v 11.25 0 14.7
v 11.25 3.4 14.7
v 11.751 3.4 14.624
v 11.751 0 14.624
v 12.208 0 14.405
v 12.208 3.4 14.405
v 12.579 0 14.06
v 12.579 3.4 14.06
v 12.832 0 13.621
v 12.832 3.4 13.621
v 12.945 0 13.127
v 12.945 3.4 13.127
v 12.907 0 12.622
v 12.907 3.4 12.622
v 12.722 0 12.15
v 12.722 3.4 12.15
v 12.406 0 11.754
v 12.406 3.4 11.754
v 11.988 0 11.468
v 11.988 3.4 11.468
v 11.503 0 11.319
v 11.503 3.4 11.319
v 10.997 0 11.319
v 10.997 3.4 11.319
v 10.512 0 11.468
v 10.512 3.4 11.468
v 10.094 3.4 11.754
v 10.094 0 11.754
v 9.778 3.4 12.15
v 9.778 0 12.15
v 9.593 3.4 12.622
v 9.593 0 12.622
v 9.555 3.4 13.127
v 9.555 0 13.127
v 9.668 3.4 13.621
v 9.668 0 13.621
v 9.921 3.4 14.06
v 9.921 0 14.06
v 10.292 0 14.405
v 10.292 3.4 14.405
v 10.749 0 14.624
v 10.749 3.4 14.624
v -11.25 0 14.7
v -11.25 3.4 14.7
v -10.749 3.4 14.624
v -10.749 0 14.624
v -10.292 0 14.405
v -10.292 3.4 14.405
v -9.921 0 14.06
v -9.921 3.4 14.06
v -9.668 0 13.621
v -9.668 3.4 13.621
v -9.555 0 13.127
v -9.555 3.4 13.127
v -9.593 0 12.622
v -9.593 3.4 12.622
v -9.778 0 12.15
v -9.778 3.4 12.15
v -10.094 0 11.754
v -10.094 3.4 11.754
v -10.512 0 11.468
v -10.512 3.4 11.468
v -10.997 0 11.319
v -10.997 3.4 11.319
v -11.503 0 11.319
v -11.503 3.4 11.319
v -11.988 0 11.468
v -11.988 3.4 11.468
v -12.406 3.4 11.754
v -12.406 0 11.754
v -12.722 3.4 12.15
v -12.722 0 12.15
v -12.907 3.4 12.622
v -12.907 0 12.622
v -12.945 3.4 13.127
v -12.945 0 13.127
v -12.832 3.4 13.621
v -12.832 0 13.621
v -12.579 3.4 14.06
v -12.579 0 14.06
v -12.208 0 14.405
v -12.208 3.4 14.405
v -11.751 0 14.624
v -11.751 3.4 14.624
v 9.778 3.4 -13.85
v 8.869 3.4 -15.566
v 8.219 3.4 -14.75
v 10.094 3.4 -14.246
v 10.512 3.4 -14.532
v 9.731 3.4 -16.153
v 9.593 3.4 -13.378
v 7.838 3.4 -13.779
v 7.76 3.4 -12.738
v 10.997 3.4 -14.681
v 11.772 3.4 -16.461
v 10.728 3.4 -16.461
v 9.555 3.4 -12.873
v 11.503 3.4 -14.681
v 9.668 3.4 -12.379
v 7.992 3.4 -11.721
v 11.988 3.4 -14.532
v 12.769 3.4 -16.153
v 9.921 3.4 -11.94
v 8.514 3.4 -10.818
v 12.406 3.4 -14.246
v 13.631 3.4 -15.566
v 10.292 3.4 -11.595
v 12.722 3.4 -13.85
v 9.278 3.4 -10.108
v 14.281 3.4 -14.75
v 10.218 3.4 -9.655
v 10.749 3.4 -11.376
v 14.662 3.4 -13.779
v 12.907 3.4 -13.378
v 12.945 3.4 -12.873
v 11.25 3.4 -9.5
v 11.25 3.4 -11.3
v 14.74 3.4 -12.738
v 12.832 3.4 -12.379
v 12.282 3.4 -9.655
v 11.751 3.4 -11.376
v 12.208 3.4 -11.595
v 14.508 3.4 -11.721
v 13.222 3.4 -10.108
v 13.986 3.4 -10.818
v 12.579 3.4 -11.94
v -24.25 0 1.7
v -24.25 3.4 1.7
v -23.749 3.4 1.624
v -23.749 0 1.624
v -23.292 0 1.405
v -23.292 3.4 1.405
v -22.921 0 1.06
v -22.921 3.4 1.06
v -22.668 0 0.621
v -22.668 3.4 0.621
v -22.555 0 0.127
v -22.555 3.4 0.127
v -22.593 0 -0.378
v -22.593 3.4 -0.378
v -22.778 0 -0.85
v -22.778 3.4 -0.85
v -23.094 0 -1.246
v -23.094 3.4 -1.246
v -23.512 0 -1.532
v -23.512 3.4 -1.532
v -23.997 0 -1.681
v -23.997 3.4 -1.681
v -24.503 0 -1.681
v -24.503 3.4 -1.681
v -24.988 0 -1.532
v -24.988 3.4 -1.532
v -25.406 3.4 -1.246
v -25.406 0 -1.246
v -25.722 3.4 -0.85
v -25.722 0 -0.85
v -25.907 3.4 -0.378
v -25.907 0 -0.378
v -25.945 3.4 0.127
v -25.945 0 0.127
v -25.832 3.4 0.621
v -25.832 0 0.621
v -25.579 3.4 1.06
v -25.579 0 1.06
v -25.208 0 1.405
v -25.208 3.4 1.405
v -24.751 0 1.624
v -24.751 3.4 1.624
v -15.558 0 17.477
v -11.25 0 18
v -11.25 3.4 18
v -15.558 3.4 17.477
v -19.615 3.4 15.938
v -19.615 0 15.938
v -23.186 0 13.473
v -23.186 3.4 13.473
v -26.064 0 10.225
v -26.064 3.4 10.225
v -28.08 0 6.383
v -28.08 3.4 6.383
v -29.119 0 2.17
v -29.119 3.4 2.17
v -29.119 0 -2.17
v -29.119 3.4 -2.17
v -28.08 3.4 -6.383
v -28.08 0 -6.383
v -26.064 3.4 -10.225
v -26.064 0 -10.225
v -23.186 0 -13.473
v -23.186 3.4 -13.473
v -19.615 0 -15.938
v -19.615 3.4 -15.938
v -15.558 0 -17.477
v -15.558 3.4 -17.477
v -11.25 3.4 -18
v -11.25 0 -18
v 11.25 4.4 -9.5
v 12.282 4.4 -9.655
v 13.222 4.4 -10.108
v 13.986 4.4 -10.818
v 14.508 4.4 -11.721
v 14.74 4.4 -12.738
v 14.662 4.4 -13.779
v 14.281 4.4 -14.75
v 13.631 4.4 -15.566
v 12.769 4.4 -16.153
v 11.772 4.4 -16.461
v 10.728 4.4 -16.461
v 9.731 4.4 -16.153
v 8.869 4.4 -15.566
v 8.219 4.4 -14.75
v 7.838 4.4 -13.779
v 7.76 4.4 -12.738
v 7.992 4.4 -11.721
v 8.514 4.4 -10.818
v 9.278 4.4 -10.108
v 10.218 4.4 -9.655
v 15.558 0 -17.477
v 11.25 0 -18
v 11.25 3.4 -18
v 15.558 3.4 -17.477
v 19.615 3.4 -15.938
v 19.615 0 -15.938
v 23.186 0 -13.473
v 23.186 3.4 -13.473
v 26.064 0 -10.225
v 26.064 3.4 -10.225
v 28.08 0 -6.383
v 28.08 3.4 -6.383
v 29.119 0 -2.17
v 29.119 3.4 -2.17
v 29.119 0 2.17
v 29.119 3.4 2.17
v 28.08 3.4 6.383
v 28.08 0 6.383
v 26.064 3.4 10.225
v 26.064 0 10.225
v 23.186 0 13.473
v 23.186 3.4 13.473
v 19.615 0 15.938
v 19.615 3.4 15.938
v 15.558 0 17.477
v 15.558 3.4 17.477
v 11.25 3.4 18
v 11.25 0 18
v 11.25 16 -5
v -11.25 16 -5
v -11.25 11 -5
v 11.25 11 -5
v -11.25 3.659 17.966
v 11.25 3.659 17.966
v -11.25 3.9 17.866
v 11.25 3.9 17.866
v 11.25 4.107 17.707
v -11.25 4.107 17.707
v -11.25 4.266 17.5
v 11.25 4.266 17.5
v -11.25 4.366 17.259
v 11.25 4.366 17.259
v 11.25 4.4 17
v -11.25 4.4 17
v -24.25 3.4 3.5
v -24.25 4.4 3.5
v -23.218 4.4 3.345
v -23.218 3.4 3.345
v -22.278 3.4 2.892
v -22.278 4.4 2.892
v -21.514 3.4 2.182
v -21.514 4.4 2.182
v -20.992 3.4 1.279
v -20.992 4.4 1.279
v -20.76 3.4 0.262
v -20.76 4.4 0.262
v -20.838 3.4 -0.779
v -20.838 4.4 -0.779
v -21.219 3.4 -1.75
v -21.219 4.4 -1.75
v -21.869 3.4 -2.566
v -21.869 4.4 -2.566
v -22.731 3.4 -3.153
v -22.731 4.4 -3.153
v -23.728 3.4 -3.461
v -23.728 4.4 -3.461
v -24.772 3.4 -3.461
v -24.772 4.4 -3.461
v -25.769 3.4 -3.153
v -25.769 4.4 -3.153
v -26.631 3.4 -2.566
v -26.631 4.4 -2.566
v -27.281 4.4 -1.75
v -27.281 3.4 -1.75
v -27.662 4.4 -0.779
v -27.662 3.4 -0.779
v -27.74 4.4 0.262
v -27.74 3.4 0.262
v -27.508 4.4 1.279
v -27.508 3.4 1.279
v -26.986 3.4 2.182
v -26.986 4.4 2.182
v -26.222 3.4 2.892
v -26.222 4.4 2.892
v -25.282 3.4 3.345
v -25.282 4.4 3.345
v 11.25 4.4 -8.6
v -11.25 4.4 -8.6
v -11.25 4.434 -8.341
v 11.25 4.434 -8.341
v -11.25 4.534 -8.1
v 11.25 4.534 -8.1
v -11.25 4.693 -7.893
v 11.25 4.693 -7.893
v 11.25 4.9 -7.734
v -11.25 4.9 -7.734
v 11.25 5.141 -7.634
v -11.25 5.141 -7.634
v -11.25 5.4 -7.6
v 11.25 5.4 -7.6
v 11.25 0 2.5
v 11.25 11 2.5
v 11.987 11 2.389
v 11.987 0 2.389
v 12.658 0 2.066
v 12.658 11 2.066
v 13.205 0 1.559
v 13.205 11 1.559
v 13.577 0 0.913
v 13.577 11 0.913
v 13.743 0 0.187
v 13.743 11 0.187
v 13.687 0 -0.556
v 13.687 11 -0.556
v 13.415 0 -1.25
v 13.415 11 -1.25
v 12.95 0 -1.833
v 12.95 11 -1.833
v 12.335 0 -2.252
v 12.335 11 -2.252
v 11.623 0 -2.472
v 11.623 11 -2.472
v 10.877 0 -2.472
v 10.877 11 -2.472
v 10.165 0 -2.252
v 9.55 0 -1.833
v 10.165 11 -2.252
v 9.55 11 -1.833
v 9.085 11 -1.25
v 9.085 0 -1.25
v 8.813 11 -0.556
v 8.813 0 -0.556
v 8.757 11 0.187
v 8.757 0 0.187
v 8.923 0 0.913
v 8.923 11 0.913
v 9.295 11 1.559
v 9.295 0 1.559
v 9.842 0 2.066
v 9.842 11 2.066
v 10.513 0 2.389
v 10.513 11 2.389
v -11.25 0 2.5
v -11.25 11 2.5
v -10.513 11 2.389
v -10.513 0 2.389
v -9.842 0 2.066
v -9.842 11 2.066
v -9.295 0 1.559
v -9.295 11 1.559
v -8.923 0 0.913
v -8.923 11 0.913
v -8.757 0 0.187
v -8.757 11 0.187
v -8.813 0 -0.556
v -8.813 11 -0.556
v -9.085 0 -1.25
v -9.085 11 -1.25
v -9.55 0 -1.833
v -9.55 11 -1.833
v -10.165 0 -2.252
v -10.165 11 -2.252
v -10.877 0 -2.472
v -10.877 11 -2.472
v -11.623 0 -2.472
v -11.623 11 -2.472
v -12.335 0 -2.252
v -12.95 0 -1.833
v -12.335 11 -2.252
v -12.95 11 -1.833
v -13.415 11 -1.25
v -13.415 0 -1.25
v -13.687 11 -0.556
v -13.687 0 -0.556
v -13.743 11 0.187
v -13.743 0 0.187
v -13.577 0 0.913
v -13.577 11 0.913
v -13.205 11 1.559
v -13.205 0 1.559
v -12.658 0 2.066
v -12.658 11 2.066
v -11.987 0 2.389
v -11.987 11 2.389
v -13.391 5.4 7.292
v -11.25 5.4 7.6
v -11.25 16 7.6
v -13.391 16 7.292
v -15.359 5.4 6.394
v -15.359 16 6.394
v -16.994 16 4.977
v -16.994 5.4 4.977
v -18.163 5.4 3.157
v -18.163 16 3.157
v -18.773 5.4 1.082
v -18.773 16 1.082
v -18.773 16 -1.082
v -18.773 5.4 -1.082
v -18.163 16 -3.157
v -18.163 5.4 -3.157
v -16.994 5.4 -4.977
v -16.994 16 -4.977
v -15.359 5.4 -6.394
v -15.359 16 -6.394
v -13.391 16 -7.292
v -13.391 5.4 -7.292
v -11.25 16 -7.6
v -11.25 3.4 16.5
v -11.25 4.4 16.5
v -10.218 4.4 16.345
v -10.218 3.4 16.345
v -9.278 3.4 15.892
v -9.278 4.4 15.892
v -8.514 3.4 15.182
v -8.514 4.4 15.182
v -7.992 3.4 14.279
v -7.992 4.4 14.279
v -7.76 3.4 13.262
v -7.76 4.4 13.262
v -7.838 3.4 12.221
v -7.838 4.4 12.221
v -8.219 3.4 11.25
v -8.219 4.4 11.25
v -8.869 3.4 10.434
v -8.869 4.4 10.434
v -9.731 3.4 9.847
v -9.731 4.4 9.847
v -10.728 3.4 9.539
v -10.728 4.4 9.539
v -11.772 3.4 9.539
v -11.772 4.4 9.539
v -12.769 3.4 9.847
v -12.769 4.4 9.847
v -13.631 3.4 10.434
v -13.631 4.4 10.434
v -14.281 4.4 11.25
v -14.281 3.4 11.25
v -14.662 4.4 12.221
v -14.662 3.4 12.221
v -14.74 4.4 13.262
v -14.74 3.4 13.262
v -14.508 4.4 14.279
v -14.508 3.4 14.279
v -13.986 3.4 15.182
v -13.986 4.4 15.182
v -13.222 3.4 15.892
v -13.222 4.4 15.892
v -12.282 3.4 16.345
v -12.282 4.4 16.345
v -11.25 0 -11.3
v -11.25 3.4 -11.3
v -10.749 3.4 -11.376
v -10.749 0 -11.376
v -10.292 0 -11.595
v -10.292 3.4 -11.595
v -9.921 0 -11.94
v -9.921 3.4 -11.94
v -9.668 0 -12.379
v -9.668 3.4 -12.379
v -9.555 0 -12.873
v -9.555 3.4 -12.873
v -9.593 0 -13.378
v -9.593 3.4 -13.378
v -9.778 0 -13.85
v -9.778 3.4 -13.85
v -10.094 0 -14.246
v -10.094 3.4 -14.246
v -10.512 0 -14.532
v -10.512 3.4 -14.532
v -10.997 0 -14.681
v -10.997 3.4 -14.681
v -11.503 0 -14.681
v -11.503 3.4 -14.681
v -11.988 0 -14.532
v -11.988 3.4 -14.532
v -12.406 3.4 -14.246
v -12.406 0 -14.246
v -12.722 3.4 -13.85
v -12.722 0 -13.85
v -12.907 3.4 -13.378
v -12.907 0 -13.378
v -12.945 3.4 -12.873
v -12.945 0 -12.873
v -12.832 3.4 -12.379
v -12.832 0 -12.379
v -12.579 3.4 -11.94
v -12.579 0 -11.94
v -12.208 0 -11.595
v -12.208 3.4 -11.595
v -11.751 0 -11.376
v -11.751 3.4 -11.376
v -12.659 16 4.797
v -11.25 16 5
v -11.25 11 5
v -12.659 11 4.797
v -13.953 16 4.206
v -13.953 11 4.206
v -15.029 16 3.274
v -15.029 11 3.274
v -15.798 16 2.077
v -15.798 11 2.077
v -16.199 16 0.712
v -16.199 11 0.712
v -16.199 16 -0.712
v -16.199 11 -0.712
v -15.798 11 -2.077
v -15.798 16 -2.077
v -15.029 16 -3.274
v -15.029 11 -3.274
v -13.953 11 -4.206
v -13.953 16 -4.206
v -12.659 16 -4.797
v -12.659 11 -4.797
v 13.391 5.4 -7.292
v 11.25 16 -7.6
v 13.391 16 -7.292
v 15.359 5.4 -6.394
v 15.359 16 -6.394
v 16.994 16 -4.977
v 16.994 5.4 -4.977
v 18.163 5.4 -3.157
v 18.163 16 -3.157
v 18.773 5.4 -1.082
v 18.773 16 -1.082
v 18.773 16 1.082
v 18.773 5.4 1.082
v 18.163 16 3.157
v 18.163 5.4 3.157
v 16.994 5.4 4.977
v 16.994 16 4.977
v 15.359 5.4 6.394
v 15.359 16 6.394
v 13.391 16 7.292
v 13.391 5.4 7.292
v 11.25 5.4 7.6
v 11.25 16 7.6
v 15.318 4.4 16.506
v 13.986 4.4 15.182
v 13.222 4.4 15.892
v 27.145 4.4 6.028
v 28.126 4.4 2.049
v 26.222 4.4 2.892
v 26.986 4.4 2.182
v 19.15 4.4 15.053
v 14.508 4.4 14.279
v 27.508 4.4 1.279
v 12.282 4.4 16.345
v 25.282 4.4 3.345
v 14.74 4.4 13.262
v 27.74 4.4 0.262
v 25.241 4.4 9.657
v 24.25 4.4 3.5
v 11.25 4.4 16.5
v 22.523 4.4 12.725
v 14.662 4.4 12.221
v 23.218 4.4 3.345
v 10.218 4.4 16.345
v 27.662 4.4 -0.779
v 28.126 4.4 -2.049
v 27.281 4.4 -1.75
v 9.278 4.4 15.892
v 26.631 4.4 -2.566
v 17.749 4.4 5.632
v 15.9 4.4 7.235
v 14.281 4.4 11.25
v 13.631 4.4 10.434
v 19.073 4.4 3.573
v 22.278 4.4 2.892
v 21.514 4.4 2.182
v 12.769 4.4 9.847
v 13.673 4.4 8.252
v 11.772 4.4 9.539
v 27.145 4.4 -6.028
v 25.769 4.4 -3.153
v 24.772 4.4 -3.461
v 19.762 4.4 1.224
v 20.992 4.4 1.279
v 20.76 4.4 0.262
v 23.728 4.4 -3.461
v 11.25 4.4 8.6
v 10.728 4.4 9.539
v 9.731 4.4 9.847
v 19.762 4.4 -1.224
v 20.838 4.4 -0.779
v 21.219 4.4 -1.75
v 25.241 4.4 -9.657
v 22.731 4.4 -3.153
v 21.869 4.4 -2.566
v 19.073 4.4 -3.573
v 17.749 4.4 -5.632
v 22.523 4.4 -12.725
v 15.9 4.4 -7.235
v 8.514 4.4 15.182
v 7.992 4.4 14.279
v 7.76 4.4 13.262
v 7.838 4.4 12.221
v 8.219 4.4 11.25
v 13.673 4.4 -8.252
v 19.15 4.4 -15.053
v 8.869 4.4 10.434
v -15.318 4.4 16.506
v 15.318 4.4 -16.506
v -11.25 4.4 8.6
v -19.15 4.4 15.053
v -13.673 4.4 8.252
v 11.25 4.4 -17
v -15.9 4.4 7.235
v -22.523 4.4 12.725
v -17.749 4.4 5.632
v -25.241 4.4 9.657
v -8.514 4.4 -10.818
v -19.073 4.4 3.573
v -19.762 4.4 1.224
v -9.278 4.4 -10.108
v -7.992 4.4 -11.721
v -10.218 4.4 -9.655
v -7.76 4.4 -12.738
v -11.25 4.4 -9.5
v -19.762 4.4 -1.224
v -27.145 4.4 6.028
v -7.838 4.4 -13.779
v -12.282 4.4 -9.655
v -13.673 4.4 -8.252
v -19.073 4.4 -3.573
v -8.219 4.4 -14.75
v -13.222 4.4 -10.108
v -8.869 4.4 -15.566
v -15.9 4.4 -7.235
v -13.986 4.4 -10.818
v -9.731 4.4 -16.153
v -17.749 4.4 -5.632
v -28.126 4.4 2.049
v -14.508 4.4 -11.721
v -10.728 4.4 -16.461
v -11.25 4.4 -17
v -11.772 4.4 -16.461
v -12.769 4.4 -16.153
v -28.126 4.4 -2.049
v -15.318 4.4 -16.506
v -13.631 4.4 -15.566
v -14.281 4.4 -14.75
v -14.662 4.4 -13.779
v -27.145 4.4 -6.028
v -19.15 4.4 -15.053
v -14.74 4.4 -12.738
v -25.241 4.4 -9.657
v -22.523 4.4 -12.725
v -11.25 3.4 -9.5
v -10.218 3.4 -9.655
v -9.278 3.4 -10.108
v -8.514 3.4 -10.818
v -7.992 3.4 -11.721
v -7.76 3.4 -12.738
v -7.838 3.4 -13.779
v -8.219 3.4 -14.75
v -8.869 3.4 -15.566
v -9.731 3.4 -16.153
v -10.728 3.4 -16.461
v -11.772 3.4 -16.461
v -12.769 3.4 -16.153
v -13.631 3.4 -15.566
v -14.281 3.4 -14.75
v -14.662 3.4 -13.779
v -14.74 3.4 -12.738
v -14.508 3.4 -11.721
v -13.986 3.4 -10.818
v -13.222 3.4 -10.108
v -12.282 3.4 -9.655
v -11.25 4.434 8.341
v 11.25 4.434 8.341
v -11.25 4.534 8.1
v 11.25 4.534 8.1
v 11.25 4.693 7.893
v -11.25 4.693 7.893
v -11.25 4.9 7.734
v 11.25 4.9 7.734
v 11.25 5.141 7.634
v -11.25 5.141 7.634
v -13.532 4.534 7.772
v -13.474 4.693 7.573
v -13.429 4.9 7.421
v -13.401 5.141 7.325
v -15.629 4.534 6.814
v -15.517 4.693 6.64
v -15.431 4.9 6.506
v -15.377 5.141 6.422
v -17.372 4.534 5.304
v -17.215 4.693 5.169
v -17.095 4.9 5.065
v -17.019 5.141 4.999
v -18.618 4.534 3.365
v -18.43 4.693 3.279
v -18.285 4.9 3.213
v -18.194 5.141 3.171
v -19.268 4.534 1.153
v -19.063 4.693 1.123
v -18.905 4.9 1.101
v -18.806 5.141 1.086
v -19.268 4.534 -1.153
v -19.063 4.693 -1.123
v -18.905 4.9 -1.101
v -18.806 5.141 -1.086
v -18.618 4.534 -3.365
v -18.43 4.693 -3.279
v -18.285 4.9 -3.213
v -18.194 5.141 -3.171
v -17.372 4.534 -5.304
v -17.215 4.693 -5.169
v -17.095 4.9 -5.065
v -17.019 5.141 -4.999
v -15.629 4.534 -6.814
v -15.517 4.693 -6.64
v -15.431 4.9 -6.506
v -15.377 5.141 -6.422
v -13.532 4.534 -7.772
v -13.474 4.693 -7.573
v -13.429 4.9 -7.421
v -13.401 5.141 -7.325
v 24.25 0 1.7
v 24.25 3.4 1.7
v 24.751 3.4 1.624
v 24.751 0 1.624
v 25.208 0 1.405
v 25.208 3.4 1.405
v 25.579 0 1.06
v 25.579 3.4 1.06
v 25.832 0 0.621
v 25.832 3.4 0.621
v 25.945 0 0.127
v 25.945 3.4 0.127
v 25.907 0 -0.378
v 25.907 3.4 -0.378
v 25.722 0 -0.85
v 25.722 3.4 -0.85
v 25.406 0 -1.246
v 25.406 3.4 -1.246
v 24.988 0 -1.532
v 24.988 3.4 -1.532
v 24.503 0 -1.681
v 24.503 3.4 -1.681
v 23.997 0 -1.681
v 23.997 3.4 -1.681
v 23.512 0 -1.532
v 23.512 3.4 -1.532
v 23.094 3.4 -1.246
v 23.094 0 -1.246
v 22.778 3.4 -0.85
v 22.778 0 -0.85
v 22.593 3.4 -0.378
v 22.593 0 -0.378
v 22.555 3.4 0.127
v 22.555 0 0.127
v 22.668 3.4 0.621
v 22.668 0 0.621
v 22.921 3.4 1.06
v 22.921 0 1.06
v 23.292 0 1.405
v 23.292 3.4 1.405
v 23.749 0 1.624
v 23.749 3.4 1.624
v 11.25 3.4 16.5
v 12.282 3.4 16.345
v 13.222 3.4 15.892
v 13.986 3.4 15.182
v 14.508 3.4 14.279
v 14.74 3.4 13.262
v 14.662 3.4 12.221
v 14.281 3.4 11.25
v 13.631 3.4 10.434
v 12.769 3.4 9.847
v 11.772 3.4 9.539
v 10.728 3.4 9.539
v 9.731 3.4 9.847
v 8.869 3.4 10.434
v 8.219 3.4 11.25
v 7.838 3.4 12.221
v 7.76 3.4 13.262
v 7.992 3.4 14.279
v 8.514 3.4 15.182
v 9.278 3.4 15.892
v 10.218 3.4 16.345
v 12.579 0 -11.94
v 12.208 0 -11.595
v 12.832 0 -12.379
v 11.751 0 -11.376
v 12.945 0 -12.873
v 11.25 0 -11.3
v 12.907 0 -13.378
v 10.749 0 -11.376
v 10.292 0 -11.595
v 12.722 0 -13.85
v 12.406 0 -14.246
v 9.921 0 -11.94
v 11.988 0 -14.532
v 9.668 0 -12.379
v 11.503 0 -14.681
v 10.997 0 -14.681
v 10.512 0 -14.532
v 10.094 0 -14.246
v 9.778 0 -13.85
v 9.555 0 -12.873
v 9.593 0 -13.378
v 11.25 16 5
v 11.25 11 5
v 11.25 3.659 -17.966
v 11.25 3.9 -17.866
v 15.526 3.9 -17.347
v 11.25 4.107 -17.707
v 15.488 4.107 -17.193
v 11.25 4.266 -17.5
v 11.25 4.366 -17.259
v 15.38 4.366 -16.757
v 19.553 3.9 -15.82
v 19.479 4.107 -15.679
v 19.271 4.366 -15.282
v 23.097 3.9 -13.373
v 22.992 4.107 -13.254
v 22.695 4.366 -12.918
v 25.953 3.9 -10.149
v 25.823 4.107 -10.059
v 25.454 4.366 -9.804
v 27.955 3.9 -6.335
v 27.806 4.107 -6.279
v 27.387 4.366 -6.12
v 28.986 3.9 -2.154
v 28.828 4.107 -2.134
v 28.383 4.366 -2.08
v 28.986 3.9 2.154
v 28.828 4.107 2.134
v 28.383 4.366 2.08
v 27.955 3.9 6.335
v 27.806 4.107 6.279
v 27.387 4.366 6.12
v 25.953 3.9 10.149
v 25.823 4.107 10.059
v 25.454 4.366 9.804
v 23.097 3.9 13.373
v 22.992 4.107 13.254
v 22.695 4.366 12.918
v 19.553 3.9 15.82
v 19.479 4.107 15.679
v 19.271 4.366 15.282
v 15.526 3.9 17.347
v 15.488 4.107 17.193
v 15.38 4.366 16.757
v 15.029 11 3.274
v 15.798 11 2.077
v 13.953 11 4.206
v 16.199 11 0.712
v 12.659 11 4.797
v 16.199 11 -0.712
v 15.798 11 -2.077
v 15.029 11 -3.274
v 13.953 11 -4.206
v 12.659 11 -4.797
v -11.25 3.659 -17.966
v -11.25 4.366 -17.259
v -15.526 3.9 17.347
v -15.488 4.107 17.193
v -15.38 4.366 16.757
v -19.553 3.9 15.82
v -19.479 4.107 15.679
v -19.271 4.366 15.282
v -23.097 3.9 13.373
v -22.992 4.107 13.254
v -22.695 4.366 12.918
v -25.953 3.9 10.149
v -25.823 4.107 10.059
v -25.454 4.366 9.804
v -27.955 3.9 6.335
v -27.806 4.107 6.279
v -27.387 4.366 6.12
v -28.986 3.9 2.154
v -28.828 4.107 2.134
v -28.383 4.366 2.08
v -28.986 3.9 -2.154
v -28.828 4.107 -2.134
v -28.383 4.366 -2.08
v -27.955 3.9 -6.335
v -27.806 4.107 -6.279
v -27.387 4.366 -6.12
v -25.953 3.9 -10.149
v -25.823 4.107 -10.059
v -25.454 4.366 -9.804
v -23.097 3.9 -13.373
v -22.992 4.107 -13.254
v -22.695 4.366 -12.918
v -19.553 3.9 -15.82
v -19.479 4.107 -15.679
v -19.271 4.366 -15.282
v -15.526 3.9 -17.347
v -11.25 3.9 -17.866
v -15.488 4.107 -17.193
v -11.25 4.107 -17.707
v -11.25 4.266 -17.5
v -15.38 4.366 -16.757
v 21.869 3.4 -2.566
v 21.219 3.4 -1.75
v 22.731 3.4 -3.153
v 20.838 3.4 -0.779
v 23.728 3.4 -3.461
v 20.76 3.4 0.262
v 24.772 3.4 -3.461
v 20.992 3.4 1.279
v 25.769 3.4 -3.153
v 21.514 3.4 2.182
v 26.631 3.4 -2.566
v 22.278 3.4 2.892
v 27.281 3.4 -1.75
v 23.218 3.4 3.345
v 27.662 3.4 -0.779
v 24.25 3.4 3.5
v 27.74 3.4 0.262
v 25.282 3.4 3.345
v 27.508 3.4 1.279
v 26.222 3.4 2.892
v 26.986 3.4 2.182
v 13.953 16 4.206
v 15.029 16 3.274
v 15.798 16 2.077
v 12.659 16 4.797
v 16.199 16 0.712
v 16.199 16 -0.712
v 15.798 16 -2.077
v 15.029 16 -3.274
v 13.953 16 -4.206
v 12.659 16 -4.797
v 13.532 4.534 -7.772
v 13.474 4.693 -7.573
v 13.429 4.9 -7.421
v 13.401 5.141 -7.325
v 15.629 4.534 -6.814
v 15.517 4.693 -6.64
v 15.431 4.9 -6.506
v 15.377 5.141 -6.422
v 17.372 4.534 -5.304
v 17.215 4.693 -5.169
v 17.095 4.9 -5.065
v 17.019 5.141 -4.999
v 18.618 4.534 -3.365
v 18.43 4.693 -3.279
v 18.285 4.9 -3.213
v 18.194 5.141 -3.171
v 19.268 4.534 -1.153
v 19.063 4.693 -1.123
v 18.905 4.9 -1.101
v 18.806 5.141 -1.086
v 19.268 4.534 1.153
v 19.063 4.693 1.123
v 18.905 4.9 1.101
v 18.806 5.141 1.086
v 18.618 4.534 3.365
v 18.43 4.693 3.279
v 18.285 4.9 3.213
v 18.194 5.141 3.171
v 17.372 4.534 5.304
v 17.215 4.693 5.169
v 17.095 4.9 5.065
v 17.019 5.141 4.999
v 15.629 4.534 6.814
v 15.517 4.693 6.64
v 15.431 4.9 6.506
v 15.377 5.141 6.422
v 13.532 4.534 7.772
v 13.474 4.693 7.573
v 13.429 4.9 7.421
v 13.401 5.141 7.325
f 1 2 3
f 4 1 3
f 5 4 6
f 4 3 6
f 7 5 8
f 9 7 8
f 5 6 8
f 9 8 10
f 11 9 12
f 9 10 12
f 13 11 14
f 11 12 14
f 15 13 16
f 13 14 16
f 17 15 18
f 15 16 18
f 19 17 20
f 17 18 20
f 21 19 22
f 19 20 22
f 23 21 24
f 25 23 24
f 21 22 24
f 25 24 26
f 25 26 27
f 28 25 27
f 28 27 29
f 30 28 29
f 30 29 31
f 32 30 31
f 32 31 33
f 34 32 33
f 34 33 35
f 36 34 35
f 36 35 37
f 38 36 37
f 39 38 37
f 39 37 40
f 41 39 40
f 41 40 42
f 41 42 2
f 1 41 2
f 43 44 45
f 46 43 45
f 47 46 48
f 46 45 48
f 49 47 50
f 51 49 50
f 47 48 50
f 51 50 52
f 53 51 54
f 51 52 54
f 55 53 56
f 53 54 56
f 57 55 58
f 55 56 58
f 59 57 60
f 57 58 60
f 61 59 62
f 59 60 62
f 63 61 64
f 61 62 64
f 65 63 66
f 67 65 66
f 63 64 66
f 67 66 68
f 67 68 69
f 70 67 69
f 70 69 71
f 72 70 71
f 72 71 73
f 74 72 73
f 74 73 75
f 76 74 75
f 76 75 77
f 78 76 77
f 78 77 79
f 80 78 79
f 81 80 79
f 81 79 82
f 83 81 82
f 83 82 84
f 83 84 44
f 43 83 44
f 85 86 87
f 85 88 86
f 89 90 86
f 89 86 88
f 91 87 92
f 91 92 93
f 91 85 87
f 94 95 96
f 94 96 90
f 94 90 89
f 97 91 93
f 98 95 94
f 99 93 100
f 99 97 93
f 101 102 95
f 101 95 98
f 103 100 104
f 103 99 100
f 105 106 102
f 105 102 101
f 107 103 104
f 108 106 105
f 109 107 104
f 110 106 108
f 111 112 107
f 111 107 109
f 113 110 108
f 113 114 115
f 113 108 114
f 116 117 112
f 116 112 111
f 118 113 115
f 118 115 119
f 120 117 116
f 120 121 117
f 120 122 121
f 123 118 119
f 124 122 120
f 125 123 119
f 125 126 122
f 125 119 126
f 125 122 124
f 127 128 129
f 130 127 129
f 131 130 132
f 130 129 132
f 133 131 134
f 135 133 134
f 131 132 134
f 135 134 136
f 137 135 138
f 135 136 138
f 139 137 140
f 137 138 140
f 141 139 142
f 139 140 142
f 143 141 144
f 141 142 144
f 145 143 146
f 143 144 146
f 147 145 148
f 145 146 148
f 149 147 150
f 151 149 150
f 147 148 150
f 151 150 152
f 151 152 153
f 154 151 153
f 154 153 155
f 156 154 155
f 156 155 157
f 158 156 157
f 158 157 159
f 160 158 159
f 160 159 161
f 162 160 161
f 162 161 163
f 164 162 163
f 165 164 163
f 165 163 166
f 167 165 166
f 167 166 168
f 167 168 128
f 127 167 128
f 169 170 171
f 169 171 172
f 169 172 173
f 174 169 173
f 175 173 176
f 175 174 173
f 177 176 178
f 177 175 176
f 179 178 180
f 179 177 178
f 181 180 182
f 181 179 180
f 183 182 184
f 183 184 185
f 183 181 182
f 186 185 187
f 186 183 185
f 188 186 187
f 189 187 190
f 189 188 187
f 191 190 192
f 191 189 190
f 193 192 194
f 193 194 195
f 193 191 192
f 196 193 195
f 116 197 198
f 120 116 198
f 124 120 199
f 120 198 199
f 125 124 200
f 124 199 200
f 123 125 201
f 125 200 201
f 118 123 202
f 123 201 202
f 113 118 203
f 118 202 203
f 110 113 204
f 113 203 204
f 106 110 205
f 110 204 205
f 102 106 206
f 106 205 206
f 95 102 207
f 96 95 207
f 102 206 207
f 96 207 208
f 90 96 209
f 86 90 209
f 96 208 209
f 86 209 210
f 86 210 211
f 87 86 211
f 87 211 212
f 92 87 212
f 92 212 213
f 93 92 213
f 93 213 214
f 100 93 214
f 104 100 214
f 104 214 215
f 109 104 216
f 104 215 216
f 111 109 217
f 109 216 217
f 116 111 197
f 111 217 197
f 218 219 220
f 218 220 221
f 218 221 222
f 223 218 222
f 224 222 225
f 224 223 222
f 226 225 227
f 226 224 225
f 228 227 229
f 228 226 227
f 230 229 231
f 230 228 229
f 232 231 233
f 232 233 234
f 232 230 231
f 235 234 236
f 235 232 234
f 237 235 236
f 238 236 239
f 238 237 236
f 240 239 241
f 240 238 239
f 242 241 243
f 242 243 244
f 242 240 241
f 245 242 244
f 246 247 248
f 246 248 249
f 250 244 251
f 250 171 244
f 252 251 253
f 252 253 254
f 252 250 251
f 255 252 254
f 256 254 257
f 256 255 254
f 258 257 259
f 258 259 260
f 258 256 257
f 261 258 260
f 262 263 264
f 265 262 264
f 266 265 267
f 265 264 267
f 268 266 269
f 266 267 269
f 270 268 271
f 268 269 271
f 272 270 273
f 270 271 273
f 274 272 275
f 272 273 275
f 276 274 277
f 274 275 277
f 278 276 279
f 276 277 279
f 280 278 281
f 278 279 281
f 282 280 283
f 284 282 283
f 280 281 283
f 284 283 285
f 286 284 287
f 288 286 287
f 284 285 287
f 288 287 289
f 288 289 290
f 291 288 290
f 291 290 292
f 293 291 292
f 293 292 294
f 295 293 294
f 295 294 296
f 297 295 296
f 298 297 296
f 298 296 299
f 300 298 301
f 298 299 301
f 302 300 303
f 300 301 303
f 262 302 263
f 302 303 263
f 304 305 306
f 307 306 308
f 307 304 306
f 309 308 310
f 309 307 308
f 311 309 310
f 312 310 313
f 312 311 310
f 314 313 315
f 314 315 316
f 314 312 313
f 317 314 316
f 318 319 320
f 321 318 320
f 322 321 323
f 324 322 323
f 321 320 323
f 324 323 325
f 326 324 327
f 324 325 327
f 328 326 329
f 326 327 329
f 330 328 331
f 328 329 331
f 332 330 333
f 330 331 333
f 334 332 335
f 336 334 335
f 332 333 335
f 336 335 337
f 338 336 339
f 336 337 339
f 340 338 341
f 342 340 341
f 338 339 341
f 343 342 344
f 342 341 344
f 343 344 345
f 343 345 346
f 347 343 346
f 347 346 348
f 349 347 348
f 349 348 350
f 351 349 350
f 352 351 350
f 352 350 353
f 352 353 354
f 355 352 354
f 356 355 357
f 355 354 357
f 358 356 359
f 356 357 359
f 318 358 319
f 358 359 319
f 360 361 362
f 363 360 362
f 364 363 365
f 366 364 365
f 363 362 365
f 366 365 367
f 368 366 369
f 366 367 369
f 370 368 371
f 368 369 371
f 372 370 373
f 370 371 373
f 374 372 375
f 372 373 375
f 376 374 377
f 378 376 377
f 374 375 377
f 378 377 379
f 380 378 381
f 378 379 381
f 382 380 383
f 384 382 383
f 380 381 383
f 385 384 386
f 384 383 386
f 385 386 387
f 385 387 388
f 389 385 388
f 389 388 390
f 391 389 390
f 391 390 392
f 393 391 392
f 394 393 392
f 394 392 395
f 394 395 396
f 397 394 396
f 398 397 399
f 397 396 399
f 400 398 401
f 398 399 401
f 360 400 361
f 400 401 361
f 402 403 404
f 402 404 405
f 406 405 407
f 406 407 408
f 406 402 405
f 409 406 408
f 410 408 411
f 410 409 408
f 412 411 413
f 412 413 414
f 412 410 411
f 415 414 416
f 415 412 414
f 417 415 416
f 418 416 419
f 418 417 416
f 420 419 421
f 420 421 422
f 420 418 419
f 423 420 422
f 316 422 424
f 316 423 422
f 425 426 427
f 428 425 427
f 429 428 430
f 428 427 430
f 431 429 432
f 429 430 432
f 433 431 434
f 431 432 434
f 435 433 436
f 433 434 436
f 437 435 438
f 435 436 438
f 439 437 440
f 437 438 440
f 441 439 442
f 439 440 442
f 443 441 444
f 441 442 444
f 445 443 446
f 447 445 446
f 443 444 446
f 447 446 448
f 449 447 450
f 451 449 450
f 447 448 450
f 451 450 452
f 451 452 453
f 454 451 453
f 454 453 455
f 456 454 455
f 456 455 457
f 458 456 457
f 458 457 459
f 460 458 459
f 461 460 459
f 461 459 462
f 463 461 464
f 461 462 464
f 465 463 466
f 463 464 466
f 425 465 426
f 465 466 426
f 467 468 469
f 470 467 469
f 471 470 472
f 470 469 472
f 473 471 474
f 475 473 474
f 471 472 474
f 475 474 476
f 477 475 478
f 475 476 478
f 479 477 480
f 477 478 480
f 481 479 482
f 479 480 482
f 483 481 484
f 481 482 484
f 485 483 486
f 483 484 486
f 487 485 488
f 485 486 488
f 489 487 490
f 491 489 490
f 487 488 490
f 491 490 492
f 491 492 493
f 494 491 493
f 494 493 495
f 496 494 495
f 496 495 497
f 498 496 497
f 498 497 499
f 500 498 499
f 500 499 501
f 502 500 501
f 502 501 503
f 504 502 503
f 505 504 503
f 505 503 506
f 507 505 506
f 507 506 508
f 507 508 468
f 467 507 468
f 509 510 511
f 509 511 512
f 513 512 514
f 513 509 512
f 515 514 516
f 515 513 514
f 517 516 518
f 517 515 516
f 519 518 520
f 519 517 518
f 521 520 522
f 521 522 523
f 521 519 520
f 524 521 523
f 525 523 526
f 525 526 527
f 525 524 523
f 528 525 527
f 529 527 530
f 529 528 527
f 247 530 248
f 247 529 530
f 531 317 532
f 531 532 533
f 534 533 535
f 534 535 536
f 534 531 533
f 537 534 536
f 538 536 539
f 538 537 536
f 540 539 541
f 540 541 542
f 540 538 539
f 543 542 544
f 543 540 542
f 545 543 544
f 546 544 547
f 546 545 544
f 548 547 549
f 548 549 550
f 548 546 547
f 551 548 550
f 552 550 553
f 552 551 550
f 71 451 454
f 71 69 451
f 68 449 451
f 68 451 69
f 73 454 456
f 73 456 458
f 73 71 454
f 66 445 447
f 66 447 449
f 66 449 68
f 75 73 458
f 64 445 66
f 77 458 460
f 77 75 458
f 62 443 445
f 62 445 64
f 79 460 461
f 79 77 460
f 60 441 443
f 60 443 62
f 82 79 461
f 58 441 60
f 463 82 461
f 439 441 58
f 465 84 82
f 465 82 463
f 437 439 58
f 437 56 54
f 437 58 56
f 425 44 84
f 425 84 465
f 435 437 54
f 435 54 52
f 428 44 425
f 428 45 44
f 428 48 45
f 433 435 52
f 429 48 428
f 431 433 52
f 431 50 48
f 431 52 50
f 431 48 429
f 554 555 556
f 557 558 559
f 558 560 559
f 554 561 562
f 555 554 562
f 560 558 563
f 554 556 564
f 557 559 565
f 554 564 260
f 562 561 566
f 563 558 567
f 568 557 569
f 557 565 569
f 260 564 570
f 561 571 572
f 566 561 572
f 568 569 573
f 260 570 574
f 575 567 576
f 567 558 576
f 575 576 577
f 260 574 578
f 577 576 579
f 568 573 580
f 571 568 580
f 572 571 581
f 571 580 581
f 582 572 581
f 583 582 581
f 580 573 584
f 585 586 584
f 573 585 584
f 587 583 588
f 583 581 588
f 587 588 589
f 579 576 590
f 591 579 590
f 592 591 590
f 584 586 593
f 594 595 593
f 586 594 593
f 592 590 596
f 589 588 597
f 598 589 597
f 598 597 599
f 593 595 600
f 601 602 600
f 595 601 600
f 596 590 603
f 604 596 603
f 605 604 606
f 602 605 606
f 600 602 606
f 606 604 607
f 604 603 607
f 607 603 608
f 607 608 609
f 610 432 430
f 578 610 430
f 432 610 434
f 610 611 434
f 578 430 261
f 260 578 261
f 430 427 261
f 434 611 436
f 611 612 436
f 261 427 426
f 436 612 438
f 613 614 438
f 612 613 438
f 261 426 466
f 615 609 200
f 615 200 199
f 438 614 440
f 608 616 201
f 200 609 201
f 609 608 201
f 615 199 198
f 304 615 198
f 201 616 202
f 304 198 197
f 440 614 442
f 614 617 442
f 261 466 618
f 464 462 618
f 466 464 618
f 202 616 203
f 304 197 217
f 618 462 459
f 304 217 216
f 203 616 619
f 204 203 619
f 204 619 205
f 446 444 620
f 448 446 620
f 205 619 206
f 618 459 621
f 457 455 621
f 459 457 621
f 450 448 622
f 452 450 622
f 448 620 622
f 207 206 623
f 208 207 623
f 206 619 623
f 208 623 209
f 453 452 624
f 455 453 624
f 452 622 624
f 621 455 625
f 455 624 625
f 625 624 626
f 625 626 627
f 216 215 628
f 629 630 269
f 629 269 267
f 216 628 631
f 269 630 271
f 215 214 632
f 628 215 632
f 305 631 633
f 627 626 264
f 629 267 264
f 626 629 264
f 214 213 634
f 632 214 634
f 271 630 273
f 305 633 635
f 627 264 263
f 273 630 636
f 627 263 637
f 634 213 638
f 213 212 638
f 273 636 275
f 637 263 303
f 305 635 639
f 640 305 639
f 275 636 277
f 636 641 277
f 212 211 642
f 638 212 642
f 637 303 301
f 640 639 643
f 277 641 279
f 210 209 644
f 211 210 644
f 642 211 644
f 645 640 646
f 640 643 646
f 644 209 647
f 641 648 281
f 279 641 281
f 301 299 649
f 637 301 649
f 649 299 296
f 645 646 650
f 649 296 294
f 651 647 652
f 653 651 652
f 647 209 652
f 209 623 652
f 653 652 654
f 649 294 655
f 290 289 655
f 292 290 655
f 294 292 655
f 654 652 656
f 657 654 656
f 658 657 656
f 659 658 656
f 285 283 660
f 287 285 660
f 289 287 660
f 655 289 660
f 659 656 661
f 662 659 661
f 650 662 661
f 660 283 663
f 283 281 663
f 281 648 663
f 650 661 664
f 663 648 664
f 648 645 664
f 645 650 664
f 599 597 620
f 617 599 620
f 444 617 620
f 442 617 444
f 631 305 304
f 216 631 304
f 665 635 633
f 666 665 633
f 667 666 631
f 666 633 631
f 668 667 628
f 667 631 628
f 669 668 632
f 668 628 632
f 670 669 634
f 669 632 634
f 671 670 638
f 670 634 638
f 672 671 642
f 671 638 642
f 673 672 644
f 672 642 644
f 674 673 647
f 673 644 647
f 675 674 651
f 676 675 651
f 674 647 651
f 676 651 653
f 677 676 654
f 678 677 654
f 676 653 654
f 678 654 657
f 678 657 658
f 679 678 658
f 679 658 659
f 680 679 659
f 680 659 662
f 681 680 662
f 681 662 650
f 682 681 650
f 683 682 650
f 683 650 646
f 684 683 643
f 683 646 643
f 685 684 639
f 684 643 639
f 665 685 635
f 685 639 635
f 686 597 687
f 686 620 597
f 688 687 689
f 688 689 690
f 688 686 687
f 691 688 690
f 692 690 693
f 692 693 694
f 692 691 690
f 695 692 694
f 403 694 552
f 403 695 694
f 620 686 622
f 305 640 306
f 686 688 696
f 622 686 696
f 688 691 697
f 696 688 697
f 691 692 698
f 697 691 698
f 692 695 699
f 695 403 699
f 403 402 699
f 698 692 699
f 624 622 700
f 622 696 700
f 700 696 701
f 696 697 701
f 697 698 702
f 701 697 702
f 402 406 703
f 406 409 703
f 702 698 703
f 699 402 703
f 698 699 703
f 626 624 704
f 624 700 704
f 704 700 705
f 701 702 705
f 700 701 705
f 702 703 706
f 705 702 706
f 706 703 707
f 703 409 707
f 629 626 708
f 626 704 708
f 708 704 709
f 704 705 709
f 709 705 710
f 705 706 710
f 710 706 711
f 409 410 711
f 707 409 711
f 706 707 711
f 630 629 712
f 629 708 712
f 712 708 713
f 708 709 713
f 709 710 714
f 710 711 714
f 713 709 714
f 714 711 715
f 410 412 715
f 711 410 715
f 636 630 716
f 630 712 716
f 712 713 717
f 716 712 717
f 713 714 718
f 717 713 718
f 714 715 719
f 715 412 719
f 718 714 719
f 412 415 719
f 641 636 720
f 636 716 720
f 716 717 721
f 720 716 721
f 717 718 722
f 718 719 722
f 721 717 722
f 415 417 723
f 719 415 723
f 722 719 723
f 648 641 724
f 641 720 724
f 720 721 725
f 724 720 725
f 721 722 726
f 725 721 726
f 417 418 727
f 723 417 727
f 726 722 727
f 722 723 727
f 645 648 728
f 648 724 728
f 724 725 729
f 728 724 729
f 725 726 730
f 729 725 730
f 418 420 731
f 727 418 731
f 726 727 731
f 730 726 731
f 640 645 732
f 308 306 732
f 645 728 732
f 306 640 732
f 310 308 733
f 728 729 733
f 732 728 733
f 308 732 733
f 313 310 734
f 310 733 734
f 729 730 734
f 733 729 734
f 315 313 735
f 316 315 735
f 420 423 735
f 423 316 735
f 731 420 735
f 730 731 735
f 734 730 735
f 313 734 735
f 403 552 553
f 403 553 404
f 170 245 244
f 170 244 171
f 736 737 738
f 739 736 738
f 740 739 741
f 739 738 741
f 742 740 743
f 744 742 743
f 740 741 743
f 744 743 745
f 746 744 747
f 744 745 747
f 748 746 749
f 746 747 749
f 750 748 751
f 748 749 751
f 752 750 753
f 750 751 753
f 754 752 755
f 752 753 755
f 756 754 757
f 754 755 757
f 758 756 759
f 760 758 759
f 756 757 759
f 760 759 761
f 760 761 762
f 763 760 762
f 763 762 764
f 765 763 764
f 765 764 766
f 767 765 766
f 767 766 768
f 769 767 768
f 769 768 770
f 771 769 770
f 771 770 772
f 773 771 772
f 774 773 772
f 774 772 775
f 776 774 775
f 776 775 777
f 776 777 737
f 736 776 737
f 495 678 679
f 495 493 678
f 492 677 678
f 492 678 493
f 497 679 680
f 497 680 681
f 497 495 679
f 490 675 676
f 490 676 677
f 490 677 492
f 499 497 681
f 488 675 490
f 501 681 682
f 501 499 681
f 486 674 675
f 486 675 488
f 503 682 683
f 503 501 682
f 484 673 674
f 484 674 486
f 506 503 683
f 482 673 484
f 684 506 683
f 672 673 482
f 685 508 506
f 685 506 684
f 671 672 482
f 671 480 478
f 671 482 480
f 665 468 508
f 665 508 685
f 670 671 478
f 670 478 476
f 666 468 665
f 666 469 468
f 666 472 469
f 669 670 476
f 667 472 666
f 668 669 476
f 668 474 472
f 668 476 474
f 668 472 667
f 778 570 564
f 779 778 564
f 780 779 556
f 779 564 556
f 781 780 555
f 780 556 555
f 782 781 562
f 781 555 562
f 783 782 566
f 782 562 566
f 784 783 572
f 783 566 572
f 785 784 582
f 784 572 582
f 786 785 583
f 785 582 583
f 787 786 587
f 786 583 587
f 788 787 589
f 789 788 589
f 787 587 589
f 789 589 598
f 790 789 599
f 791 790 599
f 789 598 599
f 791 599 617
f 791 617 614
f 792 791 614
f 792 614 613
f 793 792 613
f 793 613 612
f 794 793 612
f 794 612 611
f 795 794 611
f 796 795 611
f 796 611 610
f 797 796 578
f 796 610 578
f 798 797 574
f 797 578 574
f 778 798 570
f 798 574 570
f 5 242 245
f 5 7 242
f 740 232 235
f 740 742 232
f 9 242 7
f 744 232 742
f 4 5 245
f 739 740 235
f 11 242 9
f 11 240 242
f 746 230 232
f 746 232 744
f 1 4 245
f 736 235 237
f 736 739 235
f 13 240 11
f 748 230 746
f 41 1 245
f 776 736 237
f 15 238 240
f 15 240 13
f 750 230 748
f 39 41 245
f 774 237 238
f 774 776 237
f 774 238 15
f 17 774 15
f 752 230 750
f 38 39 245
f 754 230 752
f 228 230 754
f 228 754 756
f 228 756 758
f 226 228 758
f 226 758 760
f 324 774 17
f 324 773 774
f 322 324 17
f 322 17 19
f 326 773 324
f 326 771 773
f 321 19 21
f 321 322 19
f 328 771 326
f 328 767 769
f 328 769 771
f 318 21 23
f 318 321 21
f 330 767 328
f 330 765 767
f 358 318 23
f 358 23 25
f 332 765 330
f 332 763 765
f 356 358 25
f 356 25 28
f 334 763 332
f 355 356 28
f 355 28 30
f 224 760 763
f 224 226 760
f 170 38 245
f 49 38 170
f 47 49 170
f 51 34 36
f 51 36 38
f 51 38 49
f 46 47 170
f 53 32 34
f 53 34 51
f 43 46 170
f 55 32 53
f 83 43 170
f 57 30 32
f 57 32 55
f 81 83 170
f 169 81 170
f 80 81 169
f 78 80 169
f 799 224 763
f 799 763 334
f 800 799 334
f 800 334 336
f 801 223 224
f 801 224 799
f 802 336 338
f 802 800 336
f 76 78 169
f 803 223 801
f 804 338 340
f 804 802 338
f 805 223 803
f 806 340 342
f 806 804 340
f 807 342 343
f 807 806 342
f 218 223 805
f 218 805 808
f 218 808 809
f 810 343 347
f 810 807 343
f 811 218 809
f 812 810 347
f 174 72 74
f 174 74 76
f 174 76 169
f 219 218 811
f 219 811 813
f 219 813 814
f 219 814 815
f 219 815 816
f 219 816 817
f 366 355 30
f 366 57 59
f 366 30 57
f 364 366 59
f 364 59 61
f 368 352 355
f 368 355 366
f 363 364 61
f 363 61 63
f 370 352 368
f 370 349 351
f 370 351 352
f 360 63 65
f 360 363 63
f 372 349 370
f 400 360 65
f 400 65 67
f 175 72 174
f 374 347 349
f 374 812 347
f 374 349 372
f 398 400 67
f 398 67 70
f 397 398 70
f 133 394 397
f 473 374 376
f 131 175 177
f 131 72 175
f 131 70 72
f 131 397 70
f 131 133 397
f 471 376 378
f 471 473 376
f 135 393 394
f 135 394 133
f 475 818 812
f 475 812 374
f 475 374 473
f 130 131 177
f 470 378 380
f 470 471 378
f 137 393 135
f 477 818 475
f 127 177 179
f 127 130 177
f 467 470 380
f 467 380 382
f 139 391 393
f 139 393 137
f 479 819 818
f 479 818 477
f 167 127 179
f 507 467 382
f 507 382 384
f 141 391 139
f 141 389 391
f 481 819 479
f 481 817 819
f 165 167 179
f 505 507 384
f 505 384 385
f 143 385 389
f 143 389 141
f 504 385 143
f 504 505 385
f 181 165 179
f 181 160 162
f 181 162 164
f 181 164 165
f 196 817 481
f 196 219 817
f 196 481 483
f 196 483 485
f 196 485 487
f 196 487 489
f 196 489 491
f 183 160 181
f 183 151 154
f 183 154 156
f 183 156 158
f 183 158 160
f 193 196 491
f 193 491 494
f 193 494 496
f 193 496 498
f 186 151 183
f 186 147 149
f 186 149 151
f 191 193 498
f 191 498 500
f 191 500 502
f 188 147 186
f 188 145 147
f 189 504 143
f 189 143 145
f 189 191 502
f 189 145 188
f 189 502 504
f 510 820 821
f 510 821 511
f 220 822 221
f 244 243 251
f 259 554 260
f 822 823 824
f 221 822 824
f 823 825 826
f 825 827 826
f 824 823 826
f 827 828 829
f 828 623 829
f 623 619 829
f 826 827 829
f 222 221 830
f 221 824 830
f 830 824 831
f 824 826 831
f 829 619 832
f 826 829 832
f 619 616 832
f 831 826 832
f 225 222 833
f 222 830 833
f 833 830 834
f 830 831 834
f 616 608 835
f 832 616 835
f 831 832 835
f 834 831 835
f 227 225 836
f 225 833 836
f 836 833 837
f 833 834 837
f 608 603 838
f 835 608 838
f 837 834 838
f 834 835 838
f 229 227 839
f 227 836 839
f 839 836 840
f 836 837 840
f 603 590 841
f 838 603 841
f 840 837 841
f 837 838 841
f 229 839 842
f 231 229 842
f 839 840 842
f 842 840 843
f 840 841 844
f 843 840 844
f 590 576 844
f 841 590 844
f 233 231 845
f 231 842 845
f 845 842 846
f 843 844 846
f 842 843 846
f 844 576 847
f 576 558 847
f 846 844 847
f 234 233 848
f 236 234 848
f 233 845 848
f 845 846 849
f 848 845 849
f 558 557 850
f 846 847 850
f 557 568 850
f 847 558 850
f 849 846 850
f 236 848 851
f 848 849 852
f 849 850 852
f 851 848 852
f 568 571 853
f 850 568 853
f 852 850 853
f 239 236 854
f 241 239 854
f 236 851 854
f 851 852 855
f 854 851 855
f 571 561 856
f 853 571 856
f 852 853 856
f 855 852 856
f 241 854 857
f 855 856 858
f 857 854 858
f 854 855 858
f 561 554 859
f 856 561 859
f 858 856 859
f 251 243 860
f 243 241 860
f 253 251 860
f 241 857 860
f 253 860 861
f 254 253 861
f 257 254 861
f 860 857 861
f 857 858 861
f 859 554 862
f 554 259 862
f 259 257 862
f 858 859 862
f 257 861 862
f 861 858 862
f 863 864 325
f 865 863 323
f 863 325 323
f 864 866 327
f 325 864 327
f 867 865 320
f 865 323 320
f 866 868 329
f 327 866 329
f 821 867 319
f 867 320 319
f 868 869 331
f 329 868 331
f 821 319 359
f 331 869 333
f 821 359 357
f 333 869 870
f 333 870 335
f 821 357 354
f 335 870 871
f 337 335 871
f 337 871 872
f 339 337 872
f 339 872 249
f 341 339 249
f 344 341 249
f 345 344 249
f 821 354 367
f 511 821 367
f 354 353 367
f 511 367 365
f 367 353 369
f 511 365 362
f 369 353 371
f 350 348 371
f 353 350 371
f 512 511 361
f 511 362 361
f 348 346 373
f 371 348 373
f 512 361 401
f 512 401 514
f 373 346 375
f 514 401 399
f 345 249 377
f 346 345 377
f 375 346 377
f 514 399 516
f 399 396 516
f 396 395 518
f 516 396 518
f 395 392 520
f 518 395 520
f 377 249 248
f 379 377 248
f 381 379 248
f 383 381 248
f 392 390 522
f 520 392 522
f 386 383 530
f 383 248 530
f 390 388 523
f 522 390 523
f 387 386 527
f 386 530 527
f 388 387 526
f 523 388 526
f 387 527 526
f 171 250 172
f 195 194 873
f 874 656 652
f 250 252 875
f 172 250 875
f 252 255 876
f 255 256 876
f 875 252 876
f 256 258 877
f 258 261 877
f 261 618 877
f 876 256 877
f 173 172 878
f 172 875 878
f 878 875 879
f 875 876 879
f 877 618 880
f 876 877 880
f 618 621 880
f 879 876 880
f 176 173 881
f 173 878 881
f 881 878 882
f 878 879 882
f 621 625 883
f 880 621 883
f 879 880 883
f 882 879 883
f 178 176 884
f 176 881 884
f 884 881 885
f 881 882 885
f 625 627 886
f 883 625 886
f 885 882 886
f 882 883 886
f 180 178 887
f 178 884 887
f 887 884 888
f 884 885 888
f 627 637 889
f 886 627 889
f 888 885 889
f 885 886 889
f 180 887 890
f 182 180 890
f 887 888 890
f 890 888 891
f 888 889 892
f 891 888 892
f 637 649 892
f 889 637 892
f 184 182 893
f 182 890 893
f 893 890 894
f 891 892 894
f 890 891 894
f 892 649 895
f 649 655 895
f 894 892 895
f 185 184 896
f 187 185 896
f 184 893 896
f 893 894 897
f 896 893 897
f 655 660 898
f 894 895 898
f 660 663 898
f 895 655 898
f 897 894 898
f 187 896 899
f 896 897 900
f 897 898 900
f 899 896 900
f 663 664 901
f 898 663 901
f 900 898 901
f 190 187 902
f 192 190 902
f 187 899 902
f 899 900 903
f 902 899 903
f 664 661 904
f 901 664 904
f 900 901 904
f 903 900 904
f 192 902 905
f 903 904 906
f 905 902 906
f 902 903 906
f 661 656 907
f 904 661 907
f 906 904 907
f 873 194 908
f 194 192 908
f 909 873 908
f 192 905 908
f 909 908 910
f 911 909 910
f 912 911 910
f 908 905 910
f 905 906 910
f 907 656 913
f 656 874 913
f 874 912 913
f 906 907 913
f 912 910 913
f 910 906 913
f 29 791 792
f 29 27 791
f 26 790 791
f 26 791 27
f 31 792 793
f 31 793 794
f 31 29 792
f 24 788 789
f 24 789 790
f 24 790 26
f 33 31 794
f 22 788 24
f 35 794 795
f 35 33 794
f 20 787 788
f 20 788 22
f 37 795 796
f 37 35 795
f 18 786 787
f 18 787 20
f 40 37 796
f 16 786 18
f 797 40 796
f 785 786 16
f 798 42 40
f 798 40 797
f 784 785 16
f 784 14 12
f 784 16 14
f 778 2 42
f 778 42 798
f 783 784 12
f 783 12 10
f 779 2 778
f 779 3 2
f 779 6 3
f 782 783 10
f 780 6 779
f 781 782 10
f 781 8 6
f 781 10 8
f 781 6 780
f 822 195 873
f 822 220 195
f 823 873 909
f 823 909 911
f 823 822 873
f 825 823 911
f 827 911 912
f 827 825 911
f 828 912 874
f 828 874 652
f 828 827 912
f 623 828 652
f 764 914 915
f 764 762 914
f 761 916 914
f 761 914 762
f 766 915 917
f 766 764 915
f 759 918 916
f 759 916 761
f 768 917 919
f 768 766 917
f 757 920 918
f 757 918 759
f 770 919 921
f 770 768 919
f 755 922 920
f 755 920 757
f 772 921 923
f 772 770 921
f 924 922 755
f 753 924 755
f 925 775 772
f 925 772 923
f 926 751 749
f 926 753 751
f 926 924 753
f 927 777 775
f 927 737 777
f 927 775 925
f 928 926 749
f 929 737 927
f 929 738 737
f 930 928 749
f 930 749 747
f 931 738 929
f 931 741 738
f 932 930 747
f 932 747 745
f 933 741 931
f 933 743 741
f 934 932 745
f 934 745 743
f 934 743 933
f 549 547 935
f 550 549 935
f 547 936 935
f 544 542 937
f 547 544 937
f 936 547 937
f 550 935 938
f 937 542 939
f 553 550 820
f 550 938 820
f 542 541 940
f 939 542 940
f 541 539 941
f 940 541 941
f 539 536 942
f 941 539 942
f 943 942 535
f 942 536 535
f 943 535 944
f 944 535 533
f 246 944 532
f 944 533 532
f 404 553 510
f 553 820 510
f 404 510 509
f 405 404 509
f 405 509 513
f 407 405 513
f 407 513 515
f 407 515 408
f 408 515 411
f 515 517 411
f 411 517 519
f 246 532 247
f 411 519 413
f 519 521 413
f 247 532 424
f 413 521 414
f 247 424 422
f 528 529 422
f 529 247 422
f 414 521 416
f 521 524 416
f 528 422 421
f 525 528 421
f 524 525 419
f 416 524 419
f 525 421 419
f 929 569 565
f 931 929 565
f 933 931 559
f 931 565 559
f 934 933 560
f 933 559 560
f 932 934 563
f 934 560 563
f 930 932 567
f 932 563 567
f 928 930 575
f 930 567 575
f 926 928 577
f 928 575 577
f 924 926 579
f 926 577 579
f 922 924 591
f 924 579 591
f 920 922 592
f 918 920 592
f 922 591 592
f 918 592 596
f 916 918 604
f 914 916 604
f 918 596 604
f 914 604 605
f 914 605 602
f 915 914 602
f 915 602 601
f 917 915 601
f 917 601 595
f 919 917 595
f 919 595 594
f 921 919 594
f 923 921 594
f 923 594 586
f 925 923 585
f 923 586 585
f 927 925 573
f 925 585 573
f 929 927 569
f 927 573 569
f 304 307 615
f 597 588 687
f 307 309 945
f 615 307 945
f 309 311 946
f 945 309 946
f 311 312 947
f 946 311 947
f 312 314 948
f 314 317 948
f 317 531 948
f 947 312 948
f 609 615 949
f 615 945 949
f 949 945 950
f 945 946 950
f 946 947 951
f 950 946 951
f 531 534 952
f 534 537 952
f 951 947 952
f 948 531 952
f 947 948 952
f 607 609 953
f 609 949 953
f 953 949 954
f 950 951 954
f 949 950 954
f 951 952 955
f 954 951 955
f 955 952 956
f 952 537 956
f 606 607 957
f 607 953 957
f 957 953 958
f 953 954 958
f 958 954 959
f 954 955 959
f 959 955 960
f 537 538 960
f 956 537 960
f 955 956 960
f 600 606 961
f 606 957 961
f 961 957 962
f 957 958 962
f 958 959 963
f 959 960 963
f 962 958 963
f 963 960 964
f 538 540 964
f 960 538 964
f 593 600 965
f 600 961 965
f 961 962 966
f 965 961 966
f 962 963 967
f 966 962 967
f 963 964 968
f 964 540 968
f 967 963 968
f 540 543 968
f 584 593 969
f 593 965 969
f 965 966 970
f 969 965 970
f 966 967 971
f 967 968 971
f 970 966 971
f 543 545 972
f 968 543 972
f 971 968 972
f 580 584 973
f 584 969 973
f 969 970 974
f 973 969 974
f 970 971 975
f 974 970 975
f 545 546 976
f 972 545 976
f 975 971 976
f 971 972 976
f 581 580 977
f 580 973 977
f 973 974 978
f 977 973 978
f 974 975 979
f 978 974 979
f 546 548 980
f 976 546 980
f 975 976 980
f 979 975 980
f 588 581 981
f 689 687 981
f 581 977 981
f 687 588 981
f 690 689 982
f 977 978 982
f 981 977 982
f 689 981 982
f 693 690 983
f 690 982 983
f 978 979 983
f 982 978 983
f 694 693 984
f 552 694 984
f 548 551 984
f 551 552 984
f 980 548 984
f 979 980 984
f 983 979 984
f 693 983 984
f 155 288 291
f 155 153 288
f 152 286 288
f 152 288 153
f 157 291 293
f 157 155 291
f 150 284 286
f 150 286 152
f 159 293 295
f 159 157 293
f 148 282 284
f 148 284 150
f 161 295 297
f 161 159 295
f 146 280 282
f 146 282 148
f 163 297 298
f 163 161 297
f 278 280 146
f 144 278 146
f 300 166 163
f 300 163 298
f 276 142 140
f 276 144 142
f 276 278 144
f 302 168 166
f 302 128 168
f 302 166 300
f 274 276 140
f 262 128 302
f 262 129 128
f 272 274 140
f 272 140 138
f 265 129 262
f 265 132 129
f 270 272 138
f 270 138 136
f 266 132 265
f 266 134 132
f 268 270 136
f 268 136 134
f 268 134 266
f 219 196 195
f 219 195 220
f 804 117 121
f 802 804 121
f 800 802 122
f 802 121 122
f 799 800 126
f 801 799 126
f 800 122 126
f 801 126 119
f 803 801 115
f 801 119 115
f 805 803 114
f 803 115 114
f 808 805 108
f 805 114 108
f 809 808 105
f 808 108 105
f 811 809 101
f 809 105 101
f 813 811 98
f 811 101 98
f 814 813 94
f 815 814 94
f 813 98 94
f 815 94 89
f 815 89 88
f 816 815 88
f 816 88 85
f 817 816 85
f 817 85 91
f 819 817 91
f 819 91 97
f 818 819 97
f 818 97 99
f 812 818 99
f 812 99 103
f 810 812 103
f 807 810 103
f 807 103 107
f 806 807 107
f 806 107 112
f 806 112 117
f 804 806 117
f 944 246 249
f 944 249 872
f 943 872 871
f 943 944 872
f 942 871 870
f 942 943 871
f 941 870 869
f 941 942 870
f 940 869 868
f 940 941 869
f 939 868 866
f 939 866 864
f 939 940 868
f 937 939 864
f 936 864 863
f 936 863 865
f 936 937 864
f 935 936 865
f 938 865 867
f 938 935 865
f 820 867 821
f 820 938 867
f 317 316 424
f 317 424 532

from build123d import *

# Parameters (mm, degrees)
BOSS_EXTRUDE1_DEPTH = 4.4
SKETCH2_R           = 3.5
CUT_EXTRUDE1_DEPTH  = 1
SKETCH2_3_R         = 1.7
CUT_EXTRUDE2_DEPTH  = 35.625460286
BOSS_EXTRUDE2_DEPTH = 11.6
FILLET1_R           = 1
CUT_EXTRUDE3_DEPTH  = 5
SKETCH5_R           = 2.5
CUT_EXTRUDE4_DEPTH  = 11


with BuildPart() as part:
    # Sketch1 → Boss-Extrude1 (new body)
    with BuildSketch(Plane(origin=(0, 0, 0), x_dir=(1, 0, 0), z_dir=(0, 1, 0))):
        with BuildLine():
            Line((-11.25, 18), (11.25, 18))
            ThreePointArc((11.25, 18), (29.25, 0), (11.25, -18))
            Line((11.25, -18), (-11.25, -18))
            ThreePointArc((-11.25, -18), (-29.25, 0), (-11.25, 18))
        make_face()
    extrude(amount=BOSS_EXTRUDE1_DEPTH)

    # Sketch2 → Cut-Extrude1 (cut)
    with BuildSketch(Plane(origin=(0, 4.4, 0), x_dir=(1, 0, 0), z_dir=(0, 1, 0))):
        with Locations(Location((-24.25, 0, 0), (0, 0, 270))):
            Circle(SKETCH2_R)
        with Locations(Location((-11.25, 13, 0), (0, 0, 270))):
            Circle(SKETCH2_R)
        with Locations(Location((11.25, 13, 0), (0, 0, 270))):
            Circle(SKETCH2_R)
        with Locations(Location((24.25, 0, 0), (0, 0, 270))):
            Circle(SKETCH2_R)
        with Locations(Location((11.25, -13, 0), (0, 0, 270))):
            Circle(SKETCH2_R)
        with Locations(Location((-11.25, -13, 0), (0, 0, 270))):
            Circle(SKETCH2_R)
    extrude(amount=-CUT_EXTRUDE1_DEPTH, mode=Mode.SUBTRACT)

    # Sketch2<3> → Cut-Extrude2 (cut, through all)
    with BuildSketch(Plane(origin=(0, 4.4, 0), x_dir=(1, 0, 0), z_dir=(0, 1, 0))):
        with Locations(Location((-11.25, 13, 0), (0, 0, 270))):
            Circle(SKETCH2_3_R)
        with Locations(Location((-24.25, 0, 0), (0, 0, 270))):
            Circle(SKETCH2_3_R)
        with Locations(Location((-11.25, -13, 0), (0, 0, 270))):
            Circle(SKETCH2_3_R)
        with Locations(Location((11.25, -13, 0), (0, 0, 270))):
            Circle(SKETCH2_3_R)
        with Locations(Location((24.25, 0, 0), (0, 0, 270))):
            Circle(SKETCH2_3_R)
        with Locations(Location((11.25, 13, 0), (0, 0, 270))):
            Circle(SKETCH2_3_R)
    extrude(amount=-CUT_EXTRUDE2_DEPTH, mode=Mode.SUBTRACT)

    # Sketch3 → Boss-Extrude2 (add)
    with BuildSketch(Plane(origin=(0, 4.4, 0), x_dir=(1, 0, 0), z_dir=(0, 1, 0))):
        with BuildLine():
            Line((-11.25, 7.6), (11.25, 7.6))
            ThreePointArc((11.25, 7.6), (18.85, 0), (11.25, -7.6))
            Line((11.25, -7.6), (-11.25, -7.6))
            ThreePointArc((-11.25, -7.6), (-18.85, 0), (-11.25, 7.6))
        make_face()
    extrude(amount=BOSS_EXTRUDE2_DEPTH)

    # Fillet1
    fillet1_edges = [part.edges().sort_by_distance(p)[0] for p in [
        (29.25, 4.4, 0),
        (0, 4.4, -18),
        (-29.25, 4.4, 0),
        (-18.85, 4.4, 0),
        (0, 4.4, 7.6),
        (18.85, 4.4, 0),
        (0, 4.4, -7.6),
        (0, 4.4, 18),
    ]]
    fillet(fillet1_edges, radius=FILLET1_R)

    # Sketch4 → Cut-Extrude3 (cut)
    with BuildSketch(Plane(origin=(0, 16, 0), x_dir=(1, 0, 0), z_dir=(0, 1, 0))):
        with BuildLine():
            Line((-11.25, 5), (11.25, 5))
            ThreePointArc((11.25, 5), (16.25, 0), (11.25, -5))
            Line((11.25, -5), (-11.25, -5))
            ThreePointArc((-11.25, -5), (-16.25, 0), (-11.25, 5))
        make_face()
    extrude(amount=-CUT_EXTRUDE3_DEPTH, mode=Mode.SUBTRACT)

    # Sketch5 → Cut-Extrude4 (cut)
    with BuildSketch(Plane(origin=(0, 11, 0), x_dir=(1, 0, 0), z_dir=(0, 1, 0))):
        with Locations(Location((-11.25, 0, 0), (0, 0, 270))):
            Circle(SKETCH5_R)
        with Locations(Location((11.25, 0, 0), (0, 0, 270))):
            Circle(SKETCH5_R)
    extrude(amount=-CUT_EXTRUDE4_DEPTH, mode=Mode.SUBTRACT)


solid = part.part
